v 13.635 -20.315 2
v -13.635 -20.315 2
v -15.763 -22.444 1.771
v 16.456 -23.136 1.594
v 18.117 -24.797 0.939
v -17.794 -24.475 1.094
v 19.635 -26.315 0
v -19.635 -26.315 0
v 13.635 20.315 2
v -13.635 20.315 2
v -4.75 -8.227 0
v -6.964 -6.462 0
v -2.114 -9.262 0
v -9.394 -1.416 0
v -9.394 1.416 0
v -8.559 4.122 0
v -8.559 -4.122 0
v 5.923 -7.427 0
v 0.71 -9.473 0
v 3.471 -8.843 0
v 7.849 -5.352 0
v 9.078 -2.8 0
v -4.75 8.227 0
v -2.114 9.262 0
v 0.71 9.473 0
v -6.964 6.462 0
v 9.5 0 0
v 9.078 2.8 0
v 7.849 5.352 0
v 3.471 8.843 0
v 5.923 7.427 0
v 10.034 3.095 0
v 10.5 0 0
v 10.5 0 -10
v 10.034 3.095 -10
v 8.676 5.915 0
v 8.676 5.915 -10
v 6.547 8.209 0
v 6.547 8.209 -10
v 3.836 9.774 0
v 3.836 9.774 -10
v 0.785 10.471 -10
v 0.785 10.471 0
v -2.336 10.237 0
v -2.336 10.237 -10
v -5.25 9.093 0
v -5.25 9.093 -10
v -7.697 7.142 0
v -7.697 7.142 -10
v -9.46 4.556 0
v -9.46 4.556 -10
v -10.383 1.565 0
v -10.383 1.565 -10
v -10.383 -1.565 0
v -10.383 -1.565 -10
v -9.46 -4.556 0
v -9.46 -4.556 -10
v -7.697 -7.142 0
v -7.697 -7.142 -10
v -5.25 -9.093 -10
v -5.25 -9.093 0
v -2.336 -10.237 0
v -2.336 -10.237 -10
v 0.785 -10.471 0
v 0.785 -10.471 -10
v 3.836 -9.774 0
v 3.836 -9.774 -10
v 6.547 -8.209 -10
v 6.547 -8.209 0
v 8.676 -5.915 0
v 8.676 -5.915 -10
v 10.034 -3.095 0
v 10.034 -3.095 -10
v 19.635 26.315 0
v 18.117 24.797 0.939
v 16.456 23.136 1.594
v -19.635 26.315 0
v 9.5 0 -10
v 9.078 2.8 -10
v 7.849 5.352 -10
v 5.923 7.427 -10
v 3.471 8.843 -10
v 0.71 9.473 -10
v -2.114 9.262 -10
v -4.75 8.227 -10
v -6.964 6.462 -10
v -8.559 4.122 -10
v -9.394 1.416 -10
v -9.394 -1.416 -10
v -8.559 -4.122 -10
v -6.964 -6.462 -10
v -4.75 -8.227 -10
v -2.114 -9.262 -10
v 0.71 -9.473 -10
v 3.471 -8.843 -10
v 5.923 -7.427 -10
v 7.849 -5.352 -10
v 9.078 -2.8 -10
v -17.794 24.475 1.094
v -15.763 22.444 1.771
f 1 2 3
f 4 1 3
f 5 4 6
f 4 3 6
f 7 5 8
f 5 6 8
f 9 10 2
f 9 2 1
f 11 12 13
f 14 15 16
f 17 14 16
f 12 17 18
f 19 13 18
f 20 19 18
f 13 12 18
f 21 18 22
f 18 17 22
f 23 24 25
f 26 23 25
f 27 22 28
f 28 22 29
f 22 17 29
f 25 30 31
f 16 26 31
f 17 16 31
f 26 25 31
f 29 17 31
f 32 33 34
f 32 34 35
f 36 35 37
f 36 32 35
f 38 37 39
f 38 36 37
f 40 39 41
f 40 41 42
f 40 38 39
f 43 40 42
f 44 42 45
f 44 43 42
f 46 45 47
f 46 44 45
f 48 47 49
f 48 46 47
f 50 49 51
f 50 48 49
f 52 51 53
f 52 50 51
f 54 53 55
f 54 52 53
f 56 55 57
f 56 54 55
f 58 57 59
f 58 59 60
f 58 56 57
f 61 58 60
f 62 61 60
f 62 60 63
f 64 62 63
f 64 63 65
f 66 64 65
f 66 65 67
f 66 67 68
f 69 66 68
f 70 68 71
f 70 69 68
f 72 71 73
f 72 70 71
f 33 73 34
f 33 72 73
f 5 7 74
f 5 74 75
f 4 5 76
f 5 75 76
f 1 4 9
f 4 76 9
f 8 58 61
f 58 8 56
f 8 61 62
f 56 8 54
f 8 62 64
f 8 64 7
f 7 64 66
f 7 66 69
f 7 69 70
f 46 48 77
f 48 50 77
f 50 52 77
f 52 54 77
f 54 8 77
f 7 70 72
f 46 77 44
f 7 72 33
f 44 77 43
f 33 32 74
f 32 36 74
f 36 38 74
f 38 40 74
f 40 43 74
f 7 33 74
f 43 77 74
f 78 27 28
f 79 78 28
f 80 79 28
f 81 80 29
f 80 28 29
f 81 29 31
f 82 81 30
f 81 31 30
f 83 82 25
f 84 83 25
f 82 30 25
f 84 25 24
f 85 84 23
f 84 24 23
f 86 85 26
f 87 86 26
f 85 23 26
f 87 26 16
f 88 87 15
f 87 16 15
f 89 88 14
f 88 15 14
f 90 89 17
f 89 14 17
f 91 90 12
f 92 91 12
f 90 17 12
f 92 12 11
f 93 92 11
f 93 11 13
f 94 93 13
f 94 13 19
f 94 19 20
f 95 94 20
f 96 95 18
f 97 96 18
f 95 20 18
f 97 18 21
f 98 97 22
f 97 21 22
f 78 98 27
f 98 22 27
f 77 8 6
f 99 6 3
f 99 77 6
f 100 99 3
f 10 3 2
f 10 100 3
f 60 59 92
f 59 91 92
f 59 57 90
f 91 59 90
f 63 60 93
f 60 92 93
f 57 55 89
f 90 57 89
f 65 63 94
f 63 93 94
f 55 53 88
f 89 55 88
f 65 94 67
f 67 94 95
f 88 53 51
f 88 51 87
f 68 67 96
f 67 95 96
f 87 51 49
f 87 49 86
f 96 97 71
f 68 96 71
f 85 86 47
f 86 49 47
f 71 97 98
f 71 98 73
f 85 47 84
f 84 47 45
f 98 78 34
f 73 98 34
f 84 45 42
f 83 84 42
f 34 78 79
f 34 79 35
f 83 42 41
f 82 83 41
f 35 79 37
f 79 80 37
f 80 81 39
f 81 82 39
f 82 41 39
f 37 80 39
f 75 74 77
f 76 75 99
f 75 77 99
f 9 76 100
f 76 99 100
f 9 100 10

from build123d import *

# Parameters (mm, degrees)
F0_R        = 10.5
F0_R_2      = 9.5
F1_DEPTH    = 10
F2_W        = 39.2694026232
F2_H        = 52.6303946972
F3_DEPTH    = 1
F4_DEPTH    = 1
F5_T1_DEPTH = 82.6303946972
F5_T3_DEPTH = 69.2694026232


# Not quite as in the source:
# - a fillet or chamfer that OpenCascade refuses, or shapes differently, is made with other operations: its cross-section is extruded or revolved along the edge and cut away or added


with BuildPart() as f1:
    # F0 (on Top) → F1 (new body)
    with BuildSketch(Plane.XY):
        Circle(F0_R)
        Circle(F0_R_2, mode=Mode.SUBTRACT)
    extrude(amount=-F1_DEPTH)

    # F2 (on Top) → F3 (join)
    with BuildSketch(Plane.XY):
        Rectangle(F2_W, F2_H)
    extrude(amount=F3_DEPTH)

    # F4 (add): a face of the model
    f4_faces = [f1.faces().sort_by_distance(p)[0] for p in [
        (0, 0, 1),
    ]]
    extrude(f4_faces, amount=F4_DEPTH)

    # F5: fillet of radius 10 on 4 edges, made by hand

    # F5_s2 → F5_t1 (cut)
    with BuildSketch(Plane.XZ.offset(-41.3151973486)):
        with BuildLine():
            ThreePointArc((19.6347013116, 0), (16.7969789718, 1.4868329805), (13.6347013116, 2))
            Line((13.6347013116, 2), (19.6347013116, 2))
            Line((19.6347013116, 2), (19.6347013116, 0))
        make_face()
        with BuildLine():
            ThreePointArc((-19.6347013116, 0), (-16.7969789718, 1.4868329805), (-13.6347013116, 2))
            Line((-13.6347013116, 2), (-19.6347013116, 2))
            Line((-19.6347013116, 2), (-19.6347013116, 0))
        make_face()
    extrude(amount=F5_T1_DEPTH, mode=Mode.SUBTRACT)

    # F5_s4 → F5_t3 (cut)
    with BuildSketch(Plane.YZ.offset(-34.6347013116)):
        with BuildLine():
            ThreePointArc((26.3151973486, 0), (23.4774750088, 1.4868329805), (20.3151973486, 2))
            Line((20.3151973486, 2), (26.3151973486, 2))
            Line((26.3151973486, 2), (26.3151973486, 0))
        make_face()
        with BuildLine():
            ThreePointArc((-20.3151973486, 2), (-23.4774750088, 1.4868329805), (-26.3151973486, 0))
            Line((-26.3151973486, 0), (-26.3151973486, 2))
            Line((-26.3151973486, 2), (-20.3151973486, 2))
        make_face()
    extrude(amount=F5_T3_DEPTH, mode=Mode.SUBTRACT)


solid = f1.part
